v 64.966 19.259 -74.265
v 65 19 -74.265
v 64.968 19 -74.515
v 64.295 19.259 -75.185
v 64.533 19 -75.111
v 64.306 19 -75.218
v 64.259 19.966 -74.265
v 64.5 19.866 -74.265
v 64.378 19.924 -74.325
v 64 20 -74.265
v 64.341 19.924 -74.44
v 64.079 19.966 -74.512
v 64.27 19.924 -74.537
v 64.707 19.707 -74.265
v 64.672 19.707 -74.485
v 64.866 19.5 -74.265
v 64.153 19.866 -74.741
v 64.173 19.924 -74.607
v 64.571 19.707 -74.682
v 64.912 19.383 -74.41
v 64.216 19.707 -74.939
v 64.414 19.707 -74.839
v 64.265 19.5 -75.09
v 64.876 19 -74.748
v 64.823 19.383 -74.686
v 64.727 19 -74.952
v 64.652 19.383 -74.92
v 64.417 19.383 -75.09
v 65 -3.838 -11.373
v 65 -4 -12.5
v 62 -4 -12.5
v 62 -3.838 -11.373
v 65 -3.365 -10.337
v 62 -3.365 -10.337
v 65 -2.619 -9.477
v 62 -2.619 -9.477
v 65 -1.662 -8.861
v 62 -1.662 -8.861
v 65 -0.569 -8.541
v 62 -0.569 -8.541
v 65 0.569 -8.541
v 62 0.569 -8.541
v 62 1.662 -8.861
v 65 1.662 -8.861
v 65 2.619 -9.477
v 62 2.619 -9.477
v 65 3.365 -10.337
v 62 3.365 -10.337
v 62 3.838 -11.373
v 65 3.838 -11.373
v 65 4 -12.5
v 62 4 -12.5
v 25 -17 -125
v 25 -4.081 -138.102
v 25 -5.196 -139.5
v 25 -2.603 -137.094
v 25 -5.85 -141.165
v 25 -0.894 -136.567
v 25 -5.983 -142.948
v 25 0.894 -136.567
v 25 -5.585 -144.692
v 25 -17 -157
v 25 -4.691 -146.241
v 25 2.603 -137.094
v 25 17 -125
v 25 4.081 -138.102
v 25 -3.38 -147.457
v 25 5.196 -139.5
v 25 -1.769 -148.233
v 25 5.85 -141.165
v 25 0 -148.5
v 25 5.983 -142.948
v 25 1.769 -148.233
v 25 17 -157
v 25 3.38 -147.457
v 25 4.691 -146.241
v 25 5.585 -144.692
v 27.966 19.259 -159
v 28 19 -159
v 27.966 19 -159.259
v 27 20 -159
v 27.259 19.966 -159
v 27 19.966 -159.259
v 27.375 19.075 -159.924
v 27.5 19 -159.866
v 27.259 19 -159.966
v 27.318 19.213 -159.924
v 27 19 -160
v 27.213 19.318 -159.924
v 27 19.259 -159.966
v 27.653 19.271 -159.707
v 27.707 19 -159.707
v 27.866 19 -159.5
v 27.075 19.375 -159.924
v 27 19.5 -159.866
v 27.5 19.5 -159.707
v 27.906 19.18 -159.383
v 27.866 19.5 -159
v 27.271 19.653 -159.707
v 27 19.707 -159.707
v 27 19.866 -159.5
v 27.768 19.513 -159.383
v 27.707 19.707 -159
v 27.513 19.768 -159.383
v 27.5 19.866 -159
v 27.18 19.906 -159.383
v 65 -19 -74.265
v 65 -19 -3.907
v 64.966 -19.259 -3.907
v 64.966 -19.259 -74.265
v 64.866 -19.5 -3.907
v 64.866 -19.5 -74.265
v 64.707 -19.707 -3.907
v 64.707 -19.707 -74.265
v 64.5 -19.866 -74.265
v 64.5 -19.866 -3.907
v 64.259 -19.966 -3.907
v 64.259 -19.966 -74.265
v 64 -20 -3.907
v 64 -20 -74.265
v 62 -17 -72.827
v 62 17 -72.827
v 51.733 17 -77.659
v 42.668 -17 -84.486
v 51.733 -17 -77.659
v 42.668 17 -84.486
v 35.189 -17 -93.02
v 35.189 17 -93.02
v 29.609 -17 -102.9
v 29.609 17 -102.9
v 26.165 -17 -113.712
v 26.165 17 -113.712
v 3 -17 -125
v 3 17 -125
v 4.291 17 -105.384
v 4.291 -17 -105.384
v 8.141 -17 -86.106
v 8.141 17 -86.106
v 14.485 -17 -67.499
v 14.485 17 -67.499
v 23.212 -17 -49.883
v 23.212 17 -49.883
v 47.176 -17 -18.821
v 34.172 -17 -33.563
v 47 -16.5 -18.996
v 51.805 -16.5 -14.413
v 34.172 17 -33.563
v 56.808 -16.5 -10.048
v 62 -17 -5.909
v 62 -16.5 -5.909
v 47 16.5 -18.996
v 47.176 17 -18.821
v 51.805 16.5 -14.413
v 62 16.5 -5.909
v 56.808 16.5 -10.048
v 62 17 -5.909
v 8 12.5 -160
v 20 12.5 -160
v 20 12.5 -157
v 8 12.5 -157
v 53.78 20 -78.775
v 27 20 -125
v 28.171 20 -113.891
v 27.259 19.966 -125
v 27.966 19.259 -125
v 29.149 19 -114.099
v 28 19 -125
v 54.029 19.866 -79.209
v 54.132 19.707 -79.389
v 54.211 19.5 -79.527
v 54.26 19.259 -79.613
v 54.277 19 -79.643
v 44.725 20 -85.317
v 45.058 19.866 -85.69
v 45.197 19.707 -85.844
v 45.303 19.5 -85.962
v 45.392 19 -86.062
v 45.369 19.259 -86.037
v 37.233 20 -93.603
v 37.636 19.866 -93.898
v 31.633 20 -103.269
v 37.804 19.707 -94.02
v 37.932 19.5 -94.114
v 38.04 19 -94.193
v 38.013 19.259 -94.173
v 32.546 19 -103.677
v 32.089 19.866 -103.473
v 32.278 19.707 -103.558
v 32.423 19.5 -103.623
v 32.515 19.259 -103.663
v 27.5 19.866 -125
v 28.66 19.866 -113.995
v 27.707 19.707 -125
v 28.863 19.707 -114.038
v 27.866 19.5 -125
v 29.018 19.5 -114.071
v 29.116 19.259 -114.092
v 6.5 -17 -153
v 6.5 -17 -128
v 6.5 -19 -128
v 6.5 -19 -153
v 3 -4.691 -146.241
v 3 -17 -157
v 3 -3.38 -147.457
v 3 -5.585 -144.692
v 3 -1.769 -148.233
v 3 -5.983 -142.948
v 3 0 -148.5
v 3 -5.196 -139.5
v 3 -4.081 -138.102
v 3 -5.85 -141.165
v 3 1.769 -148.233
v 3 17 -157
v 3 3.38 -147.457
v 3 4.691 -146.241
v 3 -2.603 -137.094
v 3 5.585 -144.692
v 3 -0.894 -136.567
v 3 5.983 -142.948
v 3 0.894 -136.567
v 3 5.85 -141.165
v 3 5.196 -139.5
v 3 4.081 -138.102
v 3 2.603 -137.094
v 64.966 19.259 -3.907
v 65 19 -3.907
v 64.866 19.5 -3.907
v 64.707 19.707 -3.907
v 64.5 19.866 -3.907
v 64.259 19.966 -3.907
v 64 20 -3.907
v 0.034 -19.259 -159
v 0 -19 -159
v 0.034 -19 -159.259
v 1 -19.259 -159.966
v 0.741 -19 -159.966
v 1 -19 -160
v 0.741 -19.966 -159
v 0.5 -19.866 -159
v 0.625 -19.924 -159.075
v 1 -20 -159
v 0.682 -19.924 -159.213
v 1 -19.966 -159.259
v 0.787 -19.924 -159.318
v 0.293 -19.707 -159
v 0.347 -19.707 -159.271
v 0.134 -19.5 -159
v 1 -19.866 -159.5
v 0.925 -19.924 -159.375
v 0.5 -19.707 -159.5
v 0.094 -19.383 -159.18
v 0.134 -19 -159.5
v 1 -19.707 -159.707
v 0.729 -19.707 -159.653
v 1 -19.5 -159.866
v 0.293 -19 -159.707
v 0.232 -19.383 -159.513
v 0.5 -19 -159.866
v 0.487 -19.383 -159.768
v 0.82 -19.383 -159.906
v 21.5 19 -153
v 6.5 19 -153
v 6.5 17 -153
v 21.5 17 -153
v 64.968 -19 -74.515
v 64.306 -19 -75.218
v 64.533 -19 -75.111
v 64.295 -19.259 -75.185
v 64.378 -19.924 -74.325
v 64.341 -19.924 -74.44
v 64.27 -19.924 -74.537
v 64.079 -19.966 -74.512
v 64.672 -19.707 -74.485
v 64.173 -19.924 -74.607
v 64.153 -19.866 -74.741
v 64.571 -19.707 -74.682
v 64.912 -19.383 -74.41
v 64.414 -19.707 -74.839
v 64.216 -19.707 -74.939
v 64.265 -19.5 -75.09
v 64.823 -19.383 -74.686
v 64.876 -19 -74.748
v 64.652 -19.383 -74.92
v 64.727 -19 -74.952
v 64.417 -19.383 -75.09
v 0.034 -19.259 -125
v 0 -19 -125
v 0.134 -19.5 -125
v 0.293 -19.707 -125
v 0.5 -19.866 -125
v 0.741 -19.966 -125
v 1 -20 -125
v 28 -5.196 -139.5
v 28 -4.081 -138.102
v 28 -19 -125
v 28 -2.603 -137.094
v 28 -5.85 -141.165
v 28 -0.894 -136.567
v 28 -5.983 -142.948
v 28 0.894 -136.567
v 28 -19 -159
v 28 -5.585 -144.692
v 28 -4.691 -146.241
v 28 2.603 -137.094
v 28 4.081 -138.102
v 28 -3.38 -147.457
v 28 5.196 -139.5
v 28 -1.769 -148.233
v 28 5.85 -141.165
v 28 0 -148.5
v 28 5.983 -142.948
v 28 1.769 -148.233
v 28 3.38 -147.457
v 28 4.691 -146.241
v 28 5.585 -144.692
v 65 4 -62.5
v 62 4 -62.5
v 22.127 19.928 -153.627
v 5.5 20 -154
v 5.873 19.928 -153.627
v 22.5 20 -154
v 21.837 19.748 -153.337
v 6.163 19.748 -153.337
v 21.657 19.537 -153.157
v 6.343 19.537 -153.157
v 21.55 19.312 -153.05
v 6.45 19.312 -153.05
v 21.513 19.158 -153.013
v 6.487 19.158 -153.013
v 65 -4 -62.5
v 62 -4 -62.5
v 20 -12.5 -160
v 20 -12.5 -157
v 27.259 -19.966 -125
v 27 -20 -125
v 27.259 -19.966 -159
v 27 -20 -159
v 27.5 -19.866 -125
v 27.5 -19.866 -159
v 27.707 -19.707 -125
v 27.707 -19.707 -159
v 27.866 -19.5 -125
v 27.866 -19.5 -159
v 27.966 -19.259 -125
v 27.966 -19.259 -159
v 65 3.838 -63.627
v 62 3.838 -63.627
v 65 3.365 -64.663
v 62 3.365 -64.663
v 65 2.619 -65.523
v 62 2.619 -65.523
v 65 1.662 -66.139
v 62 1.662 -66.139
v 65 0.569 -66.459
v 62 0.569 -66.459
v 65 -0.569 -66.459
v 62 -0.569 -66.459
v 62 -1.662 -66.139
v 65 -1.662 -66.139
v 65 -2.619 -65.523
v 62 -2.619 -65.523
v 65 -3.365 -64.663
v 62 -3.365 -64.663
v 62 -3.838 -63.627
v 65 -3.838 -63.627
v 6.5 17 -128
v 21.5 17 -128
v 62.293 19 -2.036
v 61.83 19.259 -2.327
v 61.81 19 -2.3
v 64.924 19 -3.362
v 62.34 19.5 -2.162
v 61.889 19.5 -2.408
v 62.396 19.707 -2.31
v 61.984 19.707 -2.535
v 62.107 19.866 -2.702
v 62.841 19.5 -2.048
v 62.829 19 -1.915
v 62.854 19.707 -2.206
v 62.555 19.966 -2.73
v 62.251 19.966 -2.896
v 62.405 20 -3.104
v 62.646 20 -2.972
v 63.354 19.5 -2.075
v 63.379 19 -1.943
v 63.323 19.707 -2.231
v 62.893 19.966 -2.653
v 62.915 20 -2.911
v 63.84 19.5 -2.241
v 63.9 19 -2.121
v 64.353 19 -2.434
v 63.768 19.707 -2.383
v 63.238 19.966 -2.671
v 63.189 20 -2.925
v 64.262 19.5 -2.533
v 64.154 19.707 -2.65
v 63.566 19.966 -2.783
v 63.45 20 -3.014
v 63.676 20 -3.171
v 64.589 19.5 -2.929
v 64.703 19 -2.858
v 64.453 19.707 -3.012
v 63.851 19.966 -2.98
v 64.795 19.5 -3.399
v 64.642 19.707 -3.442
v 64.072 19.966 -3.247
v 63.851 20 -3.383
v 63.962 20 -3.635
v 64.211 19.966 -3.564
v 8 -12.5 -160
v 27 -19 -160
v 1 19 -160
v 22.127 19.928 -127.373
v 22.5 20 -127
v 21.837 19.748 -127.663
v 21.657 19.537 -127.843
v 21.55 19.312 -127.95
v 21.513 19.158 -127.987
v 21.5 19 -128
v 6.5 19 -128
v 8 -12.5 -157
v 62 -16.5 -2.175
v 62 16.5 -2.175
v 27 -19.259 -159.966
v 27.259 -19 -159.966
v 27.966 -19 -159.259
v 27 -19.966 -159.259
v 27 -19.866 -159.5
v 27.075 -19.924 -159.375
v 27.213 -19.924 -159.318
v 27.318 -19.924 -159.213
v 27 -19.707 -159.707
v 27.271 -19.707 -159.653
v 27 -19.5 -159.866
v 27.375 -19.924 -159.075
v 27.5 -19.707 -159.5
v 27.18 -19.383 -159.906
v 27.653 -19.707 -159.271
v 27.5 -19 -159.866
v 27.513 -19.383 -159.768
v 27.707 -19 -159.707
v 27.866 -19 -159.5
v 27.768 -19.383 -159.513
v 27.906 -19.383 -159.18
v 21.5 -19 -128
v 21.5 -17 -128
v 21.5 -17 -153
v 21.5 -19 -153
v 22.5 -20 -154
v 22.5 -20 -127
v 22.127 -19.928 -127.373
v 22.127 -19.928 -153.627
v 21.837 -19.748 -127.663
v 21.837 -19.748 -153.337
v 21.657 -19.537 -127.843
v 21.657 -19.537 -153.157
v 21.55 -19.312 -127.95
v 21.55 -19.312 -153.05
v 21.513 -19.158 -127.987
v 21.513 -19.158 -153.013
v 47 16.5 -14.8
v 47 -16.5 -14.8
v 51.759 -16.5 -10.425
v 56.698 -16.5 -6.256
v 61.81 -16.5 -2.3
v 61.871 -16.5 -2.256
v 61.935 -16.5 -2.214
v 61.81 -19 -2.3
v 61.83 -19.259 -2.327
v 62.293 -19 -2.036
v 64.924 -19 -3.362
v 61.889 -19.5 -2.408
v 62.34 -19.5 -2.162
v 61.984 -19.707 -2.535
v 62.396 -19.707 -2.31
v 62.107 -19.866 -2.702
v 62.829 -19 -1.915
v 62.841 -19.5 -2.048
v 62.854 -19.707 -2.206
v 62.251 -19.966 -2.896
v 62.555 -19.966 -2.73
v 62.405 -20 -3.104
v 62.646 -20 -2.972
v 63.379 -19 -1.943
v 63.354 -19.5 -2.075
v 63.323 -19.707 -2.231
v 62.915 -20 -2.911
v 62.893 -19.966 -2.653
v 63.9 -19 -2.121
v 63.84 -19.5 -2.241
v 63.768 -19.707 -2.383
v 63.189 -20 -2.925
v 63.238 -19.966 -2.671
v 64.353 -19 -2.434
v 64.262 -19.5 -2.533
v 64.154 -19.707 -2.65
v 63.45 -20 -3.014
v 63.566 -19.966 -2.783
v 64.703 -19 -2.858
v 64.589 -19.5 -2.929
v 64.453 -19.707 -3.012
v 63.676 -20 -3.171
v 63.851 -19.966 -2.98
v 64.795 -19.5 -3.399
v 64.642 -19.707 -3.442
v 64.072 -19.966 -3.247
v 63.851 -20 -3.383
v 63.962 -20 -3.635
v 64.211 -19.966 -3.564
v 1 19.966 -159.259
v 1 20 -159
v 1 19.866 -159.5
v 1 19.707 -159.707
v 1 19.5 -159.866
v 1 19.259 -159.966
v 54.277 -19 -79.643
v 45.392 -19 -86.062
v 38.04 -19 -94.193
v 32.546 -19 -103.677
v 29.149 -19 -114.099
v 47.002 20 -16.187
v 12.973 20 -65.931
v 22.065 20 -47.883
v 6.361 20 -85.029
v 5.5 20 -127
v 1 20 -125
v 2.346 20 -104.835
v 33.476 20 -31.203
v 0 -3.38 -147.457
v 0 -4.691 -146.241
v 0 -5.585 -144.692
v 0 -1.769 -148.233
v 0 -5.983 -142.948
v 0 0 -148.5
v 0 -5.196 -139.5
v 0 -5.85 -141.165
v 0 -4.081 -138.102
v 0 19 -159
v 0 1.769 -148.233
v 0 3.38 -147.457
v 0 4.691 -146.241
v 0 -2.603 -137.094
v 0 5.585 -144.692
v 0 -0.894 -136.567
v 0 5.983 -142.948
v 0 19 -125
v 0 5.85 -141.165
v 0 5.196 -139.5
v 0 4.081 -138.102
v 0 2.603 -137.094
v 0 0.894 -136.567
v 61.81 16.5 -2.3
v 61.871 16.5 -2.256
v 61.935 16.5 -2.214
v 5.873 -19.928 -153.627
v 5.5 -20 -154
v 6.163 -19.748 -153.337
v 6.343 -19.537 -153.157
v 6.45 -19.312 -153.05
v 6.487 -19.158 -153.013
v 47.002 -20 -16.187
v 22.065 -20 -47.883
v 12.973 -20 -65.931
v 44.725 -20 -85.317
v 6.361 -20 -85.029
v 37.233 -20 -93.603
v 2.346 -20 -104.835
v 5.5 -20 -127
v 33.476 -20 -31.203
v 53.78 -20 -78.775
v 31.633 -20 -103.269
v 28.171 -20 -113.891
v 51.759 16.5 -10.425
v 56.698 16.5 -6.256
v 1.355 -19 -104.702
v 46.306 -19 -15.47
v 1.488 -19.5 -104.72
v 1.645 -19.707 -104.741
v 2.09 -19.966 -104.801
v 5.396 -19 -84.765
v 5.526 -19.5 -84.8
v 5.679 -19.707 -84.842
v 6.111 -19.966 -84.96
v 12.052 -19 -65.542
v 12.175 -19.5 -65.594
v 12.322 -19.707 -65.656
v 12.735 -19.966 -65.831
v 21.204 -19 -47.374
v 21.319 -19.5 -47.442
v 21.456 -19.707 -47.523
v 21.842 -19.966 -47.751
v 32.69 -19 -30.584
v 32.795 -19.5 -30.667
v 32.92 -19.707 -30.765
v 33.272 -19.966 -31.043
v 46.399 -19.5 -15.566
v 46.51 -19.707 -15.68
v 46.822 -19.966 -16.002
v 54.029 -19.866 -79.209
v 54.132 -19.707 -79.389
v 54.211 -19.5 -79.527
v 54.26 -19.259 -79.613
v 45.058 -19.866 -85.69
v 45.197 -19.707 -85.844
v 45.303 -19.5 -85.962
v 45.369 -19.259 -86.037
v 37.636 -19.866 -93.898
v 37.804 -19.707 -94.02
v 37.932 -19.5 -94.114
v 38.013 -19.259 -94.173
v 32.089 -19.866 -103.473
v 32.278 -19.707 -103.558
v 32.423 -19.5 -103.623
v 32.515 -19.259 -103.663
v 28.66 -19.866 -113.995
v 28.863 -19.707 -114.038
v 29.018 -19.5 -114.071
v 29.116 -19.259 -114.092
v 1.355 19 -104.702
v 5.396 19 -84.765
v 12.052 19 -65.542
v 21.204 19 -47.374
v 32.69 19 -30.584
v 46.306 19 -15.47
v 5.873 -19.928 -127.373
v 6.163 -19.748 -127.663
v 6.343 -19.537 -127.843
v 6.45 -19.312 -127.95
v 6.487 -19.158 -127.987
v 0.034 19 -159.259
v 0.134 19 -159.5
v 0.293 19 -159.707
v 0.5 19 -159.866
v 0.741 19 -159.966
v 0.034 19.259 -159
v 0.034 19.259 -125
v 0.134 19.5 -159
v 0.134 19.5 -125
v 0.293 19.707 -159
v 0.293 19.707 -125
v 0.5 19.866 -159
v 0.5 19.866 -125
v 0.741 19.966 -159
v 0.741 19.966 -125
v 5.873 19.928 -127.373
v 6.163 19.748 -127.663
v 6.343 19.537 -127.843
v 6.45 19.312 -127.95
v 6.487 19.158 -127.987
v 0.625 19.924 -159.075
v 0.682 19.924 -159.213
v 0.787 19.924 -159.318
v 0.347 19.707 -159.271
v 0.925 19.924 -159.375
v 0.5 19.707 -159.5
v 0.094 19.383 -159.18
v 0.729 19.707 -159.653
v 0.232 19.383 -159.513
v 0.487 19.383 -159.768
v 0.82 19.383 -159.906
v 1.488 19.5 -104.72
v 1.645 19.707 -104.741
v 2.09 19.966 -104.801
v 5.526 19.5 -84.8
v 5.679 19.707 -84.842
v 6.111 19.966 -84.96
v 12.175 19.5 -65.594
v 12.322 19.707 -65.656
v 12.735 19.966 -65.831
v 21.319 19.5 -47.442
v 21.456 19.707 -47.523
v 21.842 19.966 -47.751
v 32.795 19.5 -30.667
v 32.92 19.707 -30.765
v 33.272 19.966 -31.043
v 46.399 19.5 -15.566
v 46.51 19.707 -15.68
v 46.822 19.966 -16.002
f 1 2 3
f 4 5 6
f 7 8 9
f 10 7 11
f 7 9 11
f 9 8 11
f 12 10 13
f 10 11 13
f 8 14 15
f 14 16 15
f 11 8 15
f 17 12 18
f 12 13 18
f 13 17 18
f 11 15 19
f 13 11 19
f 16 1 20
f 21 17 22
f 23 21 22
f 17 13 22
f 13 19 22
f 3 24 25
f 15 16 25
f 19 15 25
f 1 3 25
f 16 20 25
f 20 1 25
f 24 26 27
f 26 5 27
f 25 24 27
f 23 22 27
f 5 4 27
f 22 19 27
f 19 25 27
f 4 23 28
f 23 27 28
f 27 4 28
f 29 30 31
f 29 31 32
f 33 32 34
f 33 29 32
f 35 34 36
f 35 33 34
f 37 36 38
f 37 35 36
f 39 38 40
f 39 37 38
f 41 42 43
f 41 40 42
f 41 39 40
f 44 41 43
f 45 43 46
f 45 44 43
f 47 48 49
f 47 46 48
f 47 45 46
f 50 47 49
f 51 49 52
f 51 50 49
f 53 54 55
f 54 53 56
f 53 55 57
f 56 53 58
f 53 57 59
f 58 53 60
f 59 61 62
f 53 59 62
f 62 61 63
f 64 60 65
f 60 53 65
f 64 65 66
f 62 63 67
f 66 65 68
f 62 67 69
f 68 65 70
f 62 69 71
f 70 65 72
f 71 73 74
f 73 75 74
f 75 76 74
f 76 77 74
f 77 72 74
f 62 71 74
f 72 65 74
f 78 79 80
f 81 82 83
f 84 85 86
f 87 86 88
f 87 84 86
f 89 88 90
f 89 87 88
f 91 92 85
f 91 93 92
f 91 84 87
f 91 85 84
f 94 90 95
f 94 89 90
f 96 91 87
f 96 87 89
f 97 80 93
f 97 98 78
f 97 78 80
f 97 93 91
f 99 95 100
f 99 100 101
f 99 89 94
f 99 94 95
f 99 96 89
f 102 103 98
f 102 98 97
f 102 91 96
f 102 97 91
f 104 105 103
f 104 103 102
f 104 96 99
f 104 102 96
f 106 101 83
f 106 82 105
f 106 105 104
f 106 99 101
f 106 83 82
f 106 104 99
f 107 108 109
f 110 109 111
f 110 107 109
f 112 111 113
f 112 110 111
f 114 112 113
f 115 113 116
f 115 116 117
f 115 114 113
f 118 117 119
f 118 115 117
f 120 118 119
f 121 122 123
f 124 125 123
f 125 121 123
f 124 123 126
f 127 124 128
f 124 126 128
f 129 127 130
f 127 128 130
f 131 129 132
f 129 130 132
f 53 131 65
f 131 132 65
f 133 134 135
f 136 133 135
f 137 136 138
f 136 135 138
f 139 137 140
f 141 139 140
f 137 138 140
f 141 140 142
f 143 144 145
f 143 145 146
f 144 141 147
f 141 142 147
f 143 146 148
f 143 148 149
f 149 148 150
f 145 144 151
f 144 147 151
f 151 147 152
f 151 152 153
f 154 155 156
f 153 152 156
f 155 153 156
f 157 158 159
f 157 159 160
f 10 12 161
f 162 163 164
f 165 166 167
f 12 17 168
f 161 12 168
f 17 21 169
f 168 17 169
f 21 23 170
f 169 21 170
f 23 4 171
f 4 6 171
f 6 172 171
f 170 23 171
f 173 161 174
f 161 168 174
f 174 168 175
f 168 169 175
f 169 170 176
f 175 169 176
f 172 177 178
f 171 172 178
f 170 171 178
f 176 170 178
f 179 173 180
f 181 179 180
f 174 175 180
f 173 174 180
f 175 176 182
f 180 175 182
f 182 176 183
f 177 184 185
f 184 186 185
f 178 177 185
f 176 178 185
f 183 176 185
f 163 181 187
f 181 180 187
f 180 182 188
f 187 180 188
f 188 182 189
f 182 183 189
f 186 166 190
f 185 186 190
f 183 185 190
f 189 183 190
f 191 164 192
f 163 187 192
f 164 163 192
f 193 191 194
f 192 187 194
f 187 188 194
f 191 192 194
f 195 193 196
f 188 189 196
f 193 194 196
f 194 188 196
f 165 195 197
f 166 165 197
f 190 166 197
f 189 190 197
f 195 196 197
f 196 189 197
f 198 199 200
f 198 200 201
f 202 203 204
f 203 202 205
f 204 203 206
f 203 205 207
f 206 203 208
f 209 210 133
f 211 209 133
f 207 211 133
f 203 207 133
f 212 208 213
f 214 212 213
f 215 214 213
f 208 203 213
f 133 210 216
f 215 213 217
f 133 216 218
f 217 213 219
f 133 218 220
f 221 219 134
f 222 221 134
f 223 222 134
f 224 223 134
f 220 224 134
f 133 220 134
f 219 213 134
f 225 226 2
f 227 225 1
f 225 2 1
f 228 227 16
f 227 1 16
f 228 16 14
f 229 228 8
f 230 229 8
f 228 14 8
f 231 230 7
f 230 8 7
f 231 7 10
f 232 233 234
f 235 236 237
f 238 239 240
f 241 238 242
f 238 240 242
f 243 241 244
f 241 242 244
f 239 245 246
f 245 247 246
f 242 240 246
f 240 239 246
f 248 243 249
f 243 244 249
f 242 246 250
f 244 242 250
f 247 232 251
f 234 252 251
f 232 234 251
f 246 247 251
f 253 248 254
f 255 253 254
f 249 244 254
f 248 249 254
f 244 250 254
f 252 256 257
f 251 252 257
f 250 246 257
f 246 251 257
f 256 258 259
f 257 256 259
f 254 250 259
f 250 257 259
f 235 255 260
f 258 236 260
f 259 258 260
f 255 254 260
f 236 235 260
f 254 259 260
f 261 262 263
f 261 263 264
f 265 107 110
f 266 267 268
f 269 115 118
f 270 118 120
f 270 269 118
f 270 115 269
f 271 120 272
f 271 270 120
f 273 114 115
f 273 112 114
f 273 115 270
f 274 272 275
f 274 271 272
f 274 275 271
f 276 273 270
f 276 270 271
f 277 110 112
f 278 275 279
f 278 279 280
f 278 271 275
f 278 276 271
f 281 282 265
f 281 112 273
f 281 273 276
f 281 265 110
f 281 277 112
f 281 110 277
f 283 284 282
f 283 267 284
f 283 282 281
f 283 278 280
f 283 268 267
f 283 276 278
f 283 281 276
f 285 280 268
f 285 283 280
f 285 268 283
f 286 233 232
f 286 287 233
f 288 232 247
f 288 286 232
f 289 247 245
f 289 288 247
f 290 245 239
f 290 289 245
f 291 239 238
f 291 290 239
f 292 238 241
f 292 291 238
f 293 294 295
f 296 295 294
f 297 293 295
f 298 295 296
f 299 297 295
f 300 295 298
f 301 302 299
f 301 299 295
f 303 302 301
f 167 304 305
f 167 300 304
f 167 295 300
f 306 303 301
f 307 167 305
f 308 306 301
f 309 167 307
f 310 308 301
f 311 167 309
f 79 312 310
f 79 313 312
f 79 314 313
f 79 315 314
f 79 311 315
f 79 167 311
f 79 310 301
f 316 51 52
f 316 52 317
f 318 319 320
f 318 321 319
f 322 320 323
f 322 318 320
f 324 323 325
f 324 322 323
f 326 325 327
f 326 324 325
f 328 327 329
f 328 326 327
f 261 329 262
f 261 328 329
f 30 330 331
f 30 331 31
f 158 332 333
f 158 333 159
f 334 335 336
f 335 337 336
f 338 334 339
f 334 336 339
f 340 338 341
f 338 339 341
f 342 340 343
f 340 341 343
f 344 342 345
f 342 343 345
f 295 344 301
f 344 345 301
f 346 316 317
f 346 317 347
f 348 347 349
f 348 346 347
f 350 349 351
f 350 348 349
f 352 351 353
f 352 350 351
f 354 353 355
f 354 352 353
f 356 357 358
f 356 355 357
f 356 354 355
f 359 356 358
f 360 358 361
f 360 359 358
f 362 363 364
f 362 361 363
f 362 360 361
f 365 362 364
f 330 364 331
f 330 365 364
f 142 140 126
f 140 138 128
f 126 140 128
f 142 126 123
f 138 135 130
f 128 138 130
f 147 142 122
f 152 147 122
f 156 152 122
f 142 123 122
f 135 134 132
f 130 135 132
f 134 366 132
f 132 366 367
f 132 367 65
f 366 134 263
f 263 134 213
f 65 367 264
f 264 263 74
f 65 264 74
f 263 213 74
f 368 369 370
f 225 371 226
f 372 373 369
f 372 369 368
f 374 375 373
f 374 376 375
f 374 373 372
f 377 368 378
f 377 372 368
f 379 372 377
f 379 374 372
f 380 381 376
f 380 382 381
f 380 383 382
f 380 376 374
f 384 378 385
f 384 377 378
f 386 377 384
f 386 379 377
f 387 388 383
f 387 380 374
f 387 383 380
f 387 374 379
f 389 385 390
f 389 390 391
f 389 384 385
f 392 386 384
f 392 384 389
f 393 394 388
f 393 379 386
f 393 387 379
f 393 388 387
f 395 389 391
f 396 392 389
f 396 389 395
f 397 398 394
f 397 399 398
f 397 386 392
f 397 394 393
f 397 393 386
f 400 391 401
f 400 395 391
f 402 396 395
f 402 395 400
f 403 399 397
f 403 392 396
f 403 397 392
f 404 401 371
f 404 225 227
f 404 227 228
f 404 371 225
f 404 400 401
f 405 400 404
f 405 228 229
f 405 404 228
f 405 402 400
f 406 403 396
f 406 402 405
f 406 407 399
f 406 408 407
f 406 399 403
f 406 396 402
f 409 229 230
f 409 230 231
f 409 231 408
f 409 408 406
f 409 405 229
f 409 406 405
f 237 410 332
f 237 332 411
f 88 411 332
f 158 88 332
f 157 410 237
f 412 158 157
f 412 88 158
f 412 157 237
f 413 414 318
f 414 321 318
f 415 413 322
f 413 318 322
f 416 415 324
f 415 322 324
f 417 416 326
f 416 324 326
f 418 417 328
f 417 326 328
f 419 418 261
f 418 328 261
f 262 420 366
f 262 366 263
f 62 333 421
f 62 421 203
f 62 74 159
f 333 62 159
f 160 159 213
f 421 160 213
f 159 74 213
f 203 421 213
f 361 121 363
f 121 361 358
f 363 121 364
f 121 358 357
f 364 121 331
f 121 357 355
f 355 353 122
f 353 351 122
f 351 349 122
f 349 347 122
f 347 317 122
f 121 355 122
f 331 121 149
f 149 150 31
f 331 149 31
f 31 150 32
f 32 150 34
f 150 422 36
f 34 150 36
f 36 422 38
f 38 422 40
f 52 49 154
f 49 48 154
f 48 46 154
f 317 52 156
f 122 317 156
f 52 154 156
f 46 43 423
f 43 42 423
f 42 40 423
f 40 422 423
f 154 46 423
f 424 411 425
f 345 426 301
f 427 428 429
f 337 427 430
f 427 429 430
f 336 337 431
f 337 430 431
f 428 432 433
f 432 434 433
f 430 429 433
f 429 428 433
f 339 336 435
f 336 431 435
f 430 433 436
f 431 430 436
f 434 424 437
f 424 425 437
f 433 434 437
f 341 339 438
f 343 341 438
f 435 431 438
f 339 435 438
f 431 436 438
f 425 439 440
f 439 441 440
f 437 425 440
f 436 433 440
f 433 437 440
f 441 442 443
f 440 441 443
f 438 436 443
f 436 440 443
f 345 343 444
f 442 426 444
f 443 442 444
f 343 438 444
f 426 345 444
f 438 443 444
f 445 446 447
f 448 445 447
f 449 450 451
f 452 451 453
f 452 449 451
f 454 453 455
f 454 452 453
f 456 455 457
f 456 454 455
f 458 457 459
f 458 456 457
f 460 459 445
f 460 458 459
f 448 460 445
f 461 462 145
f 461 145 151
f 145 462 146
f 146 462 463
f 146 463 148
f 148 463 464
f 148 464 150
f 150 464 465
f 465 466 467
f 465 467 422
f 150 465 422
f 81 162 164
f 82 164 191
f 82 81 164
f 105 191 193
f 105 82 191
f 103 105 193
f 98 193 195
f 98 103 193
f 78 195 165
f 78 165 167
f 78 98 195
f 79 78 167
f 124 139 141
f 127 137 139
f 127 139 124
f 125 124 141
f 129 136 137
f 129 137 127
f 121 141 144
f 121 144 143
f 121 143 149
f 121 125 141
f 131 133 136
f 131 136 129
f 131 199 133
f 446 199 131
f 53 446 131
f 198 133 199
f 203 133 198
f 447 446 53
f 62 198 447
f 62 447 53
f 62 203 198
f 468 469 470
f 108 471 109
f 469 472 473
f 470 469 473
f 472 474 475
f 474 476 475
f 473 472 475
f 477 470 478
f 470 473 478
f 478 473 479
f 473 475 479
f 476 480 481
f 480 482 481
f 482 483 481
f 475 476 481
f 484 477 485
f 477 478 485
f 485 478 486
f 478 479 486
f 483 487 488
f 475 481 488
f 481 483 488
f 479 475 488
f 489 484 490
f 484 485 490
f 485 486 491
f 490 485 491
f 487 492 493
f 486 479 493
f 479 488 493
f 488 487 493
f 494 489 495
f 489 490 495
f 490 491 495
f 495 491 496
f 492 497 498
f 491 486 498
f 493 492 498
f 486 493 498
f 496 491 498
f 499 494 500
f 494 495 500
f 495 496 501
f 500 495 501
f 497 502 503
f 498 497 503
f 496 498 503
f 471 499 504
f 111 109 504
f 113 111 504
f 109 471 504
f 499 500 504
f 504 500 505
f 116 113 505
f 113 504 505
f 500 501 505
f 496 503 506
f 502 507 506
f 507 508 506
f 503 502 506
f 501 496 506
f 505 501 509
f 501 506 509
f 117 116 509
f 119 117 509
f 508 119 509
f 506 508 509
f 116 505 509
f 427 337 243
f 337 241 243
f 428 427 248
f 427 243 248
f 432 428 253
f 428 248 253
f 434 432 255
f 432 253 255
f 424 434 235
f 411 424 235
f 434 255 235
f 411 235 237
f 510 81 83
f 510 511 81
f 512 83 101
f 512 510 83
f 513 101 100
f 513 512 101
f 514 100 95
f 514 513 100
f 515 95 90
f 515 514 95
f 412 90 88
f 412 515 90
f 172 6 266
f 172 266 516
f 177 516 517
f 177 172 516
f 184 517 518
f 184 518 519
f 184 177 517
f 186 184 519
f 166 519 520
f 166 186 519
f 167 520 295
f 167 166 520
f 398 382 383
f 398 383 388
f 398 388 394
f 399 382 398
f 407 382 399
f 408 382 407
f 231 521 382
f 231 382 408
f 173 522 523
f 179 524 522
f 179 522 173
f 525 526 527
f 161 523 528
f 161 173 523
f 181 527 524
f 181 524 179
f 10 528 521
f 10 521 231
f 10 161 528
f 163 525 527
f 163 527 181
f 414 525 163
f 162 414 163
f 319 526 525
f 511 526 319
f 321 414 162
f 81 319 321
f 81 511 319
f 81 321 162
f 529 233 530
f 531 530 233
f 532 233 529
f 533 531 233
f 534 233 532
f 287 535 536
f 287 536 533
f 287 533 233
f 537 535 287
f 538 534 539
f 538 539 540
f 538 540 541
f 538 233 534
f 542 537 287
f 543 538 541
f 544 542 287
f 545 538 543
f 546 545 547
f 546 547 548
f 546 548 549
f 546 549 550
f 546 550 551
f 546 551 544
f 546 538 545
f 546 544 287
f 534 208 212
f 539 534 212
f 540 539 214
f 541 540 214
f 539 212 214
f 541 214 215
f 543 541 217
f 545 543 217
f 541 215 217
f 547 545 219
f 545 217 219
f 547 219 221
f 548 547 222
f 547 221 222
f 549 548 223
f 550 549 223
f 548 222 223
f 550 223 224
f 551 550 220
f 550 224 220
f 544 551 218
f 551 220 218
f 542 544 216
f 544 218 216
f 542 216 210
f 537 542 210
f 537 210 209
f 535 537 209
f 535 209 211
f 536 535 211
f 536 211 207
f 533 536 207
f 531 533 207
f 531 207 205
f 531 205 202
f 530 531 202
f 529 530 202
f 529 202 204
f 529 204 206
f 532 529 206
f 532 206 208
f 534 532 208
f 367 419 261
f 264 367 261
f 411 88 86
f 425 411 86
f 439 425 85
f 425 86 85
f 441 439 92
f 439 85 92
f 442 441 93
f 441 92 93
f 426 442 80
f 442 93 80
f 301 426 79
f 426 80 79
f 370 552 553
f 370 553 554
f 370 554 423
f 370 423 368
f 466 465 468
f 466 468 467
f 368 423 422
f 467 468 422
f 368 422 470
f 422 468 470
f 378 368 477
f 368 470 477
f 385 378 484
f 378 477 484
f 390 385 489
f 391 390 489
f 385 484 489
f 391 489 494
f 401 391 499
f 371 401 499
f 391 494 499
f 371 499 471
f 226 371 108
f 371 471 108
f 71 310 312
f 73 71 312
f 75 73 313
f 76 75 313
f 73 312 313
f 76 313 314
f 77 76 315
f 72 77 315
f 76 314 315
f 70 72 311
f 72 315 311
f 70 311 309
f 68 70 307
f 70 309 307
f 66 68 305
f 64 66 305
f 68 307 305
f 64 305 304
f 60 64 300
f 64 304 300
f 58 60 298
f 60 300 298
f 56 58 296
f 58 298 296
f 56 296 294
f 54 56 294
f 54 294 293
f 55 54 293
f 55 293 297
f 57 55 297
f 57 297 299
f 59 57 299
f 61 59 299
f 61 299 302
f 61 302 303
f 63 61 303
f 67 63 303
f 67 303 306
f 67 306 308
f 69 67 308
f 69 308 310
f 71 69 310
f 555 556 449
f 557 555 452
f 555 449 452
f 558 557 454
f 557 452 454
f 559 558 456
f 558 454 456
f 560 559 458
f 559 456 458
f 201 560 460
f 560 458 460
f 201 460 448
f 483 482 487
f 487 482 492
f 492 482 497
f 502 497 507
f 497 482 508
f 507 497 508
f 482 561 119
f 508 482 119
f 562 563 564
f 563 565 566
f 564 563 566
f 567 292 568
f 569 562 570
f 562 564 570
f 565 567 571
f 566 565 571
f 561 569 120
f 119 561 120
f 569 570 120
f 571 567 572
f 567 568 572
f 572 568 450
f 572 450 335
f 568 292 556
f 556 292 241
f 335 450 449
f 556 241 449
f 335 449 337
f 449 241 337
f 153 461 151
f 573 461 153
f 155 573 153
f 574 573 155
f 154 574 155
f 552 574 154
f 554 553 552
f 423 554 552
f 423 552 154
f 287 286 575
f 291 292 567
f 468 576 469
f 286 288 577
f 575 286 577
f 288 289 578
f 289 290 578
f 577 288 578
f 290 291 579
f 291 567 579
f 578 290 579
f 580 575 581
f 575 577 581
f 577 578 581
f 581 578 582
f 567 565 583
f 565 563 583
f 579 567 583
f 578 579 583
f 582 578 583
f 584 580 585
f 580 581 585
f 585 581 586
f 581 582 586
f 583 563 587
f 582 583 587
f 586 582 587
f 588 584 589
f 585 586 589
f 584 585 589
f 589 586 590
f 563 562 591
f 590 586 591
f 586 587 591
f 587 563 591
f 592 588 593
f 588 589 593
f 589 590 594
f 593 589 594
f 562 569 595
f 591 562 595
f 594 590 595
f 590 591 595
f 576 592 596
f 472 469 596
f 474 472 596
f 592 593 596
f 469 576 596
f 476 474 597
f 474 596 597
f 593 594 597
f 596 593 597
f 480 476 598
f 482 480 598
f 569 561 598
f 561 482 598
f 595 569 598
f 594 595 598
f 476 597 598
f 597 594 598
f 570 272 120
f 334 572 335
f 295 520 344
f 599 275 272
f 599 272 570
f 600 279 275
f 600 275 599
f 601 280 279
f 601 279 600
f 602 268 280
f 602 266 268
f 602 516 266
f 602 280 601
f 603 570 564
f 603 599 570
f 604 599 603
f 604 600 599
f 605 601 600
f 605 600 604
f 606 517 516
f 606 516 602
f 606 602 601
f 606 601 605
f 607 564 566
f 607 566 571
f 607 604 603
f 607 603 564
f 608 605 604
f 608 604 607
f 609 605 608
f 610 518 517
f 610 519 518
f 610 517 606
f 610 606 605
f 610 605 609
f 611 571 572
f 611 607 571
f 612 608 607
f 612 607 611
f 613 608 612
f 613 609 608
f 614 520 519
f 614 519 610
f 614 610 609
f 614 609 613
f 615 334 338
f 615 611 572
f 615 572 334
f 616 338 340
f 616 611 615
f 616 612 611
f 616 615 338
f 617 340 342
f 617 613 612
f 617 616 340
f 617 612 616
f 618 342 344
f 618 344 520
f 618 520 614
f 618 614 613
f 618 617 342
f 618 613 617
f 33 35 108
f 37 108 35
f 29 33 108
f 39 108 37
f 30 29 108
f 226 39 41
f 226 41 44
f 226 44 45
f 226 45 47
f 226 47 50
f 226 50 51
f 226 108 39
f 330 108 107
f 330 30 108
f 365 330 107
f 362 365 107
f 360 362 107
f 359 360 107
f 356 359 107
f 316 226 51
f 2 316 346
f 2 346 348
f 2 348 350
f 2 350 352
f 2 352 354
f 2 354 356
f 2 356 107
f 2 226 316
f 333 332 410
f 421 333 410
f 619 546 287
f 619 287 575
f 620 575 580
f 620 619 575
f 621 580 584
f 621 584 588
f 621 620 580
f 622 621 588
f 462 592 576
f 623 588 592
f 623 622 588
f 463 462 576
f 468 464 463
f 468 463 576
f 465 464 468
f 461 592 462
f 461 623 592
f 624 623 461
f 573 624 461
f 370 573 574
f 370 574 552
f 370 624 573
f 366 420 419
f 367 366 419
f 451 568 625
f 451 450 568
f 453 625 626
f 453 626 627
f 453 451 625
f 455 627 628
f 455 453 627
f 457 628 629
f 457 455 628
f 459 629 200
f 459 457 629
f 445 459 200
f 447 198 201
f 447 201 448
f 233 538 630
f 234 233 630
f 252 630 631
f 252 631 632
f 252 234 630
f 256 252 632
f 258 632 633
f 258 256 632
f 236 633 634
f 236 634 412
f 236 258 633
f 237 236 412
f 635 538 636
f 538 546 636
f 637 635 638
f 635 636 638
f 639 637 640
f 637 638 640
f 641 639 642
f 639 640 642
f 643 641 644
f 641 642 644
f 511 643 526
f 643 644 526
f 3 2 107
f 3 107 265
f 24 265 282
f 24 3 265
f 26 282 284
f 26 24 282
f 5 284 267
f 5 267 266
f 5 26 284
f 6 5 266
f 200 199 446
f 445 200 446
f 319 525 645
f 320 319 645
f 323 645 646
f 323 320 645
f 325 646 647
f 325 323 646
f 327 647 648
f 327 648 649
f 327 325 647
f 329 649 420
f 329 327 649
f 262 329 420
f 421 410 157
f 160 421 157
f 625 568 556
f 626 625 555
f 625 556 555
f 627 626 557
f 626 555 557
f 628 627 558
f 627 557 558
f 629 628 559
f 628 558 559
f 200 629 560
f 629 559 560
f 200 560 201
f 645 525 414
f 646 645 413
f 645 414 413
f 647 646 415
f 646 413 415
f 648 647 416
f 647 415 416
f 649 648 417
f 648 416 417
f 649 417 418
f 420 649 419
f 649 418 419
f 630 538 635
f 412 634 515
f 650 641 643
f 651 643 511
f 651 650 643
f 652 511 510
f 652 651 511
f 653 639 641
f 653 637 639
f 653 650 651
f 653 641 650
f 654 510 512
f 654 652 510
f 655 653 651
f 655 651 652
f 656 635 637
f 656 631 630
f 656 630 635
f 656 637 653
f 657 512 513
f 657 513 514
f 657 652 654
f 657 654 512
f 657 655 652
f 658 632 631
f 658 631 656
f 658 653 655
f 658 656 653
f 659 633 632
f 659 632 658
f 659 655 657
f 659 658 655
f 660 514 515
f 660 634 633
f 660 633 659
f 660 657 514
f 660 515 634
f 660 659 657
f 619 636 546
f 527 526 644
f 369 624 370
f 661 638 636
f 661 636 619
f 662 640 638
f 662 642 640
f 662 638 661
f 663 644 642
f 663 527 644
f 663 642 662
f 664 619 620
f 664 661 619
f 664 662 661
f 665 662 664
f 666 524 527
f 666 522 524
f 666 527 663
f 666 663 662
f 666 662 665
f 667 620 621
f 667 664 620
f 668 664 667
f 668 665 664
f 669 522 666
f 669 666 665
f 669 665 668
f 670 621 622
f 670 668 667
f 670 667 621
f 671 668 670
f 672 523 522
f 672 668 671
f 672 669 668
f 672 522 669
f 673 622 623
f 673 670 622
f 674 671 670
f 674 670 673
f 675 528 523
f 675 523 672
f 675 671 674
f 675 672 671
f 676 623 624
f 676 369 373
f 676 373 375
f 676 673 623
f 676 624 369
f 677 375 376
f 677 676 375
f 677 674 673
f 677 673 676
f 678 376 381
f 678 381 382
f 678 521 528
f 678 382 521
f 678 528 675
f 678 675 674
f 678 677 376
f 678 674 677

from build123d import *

# Parameters (mm, degrees)
BOSS_EXTRUDE1_DEPTH     = 20
SHELL1_T                = 3
CUT_EXTRUDE1_REACH      = 175.853
SKETCH4_W               = 15
SKETCH4_H               = 25
CUT_EXTRUDE2_DEPTH      = 178.270979012
CUT_EXTRUDE3_REACH      = 175.853
SKETCH5_W               = 12
SKETCH5_H               = 25
SKETCH6_R               = 6
CUT_EXTRUDE4_DEPTH      = 166.435788148
CUT_EXTRUDE5_REACH      = 175.853
CUT_EXTRUDE5_END_RADIUS = 149.692307692
SKETCH7_W               = 15
SKETCH7_H               = 33
FILLET1_R               = 2
FILLET2_R               = 1


with BuildPart() as part:
    # Sketch2 → Boss-Extrude1 (new, symmetric)
    with BuildSketch(Plane(origin=(0, 0, 0), x_dir=(1, 0, 0), z_dir=(0, 1, 0))):
        with BuildLine():
            Line((65, 0), (65, 75))
            ThreePointArc((65, 75), (38.25588773, 93.89935692), (28, 125))
            Line((28, 125), (28, 160))
            Line((28, 160), (0, 160))
            Line((0, 160), (0, 125))
            ThreePointArc((0, 125), (17.221126888, 54.554985982), (65, 0))
        make_face()
    extrude(amount=BOSS_EXTRUDE1_DEPTH, both=True)

    # Shell1 (no face opened: a closed hollow body)
    add(offset(amount=-SHELL1_T, mode=Mode.PRIVATE), mode=Mode.SUBTRACT)

    # Sketch3 → Cut-Extrude1 (cut, up to next)
    with BuildSketch(Plane(origin=(65, 0, 0), x_dir=(0, 0, -1), z_dir=(1, 0, 0)), mode=Mode.PRIVATE) as cut_extrude1_sk1:
        with BuildLine():
            Line((12.5, 4), (62.5, 4))
            ThreePointArc((62.5, 4), (66.5, 0), (62.5, -4))
            Line((62.5, -4), (12.5, -4))
            ThreePointArc((12.5, -4), (8.5, 0), (12.5, 4))
        make_face()
    cut_extrude1_tool1 = extrude(cut_extrude1_sk1.sketch, amount=-CUT_EXTRUDE1_REACH, mode=Mode.PRIVATE) & part.part
    add(cut_extrude1_tool1.solids().sort_by_distance((65, 0, -37.5))[0], mode=Mode.SUBTRACT)

    # Sketch4 → Cut-Extrude2 (cut, through all)
    with BuildSketch(Plane(origin=(0, 20, 0), x_dir=(1, 0, 0), z_dir=(0, 1, 0))):
        with Locations((14, 140.5)):
            Rectangle(SKETCH4_W, SKETCH4_H)
    extrude(amount=-CUT_EXTRUDE2_DEPTH, mode=Mode.SUBTRACT)

    # Sketch5 → Cut-Extrude3 (cut, up to next)
    with BuildSketch(Plane(origin=(0, 0, -160), x_dir=(-1, 0, 0), z_dir=(0, 0, -1)), mode=Mode.PRIVATE) as cut_extrude3_sk1:
        with Locations((-14, 0)):
            Rectangle(SKETCH5_W, SKETCH5_H)
    cut_extrude3_tool1 = extrude(cut_extrude3_sk1.sketch, amount=-CUT_EXTRUDE3_REACH, mode=Mode.PRIVATE) & part.part
    add(cut_extrude3_tool1.solids().sort_by_distance((14, 0, -160))[0], mode=Mode.SUBTRACT)

    # Sketch6 → Cut-Extrude4 (cut, through all)
    with BuildSketch(Plane(origin=(28, 0, 0), x_dir=(0, 0, -1), z_dir=(1, 0, 0))):
        with Locations((142.5, 0)):
            Circle(SKETCH6_R)
    extrude(amount=-CUT_EXTRUDE4_DEPTH, mode=Mode.SUBTRACT)

    # Cut-Extrude5: up to this cylinder (the profile starts outside it)
    cut_extrude5_end = Plane(origin=(152.692307692, 0, -125), z_dir=(0, -1, 0)) * Cylinder(CUT_EXTRUDE5_END_RADIUS, 652.090615385, mode=Mode.PRIVATE)
    # Sketch7 → Cut-Extrude5 (cut, up to the surface)
    with BuildSketch(Plane.XY, mode=Mode.PRIVATE) as cut_extrude5_sk1:
        with Locations((54.5, 0)):
            Rectangle(SKETCH7_W, SKETCH7_H)
    cut_extrude5_tool1 = extrude(cut_extrude5_sk1.sketch, amount=-CUT_EXTRUDE5_REACH, mode=Mode.PRIVATE) - cut_extrude5_end
    add(cut_extrude5_tool1.solids().sort_by_distance((54.5, 0, 0))[0], mode=Mode.SUBTRACT)

    # Fillet1
    # the kernel refuses this fillet: 2 mm, written as the material it takes off along each edge
    with BuildSketch(Plane(origin=(65, -29.832655727, 0), x_dir=(-0.8111753720748651, 0, -0.584802971725695), z_dir=(0, 1, 0))) as fillet1_piece_1:
        with BuildLine():
            CenterArc((3.9073042, -1.999834123), FILLET1_R, 89.26206466, 126.527007428)
            Line((2.284953456, -3.169440067), (0, 0))
            ThreePointArc((0, 0), (1.966531145, 0.012664047), (3.933062291, 0))
        make_face()
    extrude(amount=59.665311453, mode=Mode.SUBTRACT)

    # Fillet2
    fillet2_edges = [part.edges().sort_by_distance(p)[0] for p in [
        (38.25588773, 20, -93.89935692),
        (0, 0, -160),
        (28, 0, -160),
        (65, 0, -75),
        (65, -20, -39.453609648),
        (65, 20, -39.453609648),
        (63.899775935, -20, -2.121049297),
        (63.899775935, 20, -2.121049297),
        (28, 20, -142.5),
        (14, 20, -160),
        (0, 20, -142.5),
        (16.325098118, 20, -56.305568047),
        (21.5, -20, -140.5),
        (14, -20, -128),
        (6.5, -20, -140.5),
        (14, -20, -153),
        (21.5, 20, -140.5),
        (14, 20, -153),
        (6.5, 20, -140.5),
        (14, 20, -128),
        (0, -20, -142.5),
        (14, -20, -160),
        (28, -20, -142.5),
        (38.25588773, -20, -93.89935692),
        (16.325098118, -20, -56.305568047),
    ]]
    fillet(fillet2_edges, radius=FILLET2_R)


solid = part.part
